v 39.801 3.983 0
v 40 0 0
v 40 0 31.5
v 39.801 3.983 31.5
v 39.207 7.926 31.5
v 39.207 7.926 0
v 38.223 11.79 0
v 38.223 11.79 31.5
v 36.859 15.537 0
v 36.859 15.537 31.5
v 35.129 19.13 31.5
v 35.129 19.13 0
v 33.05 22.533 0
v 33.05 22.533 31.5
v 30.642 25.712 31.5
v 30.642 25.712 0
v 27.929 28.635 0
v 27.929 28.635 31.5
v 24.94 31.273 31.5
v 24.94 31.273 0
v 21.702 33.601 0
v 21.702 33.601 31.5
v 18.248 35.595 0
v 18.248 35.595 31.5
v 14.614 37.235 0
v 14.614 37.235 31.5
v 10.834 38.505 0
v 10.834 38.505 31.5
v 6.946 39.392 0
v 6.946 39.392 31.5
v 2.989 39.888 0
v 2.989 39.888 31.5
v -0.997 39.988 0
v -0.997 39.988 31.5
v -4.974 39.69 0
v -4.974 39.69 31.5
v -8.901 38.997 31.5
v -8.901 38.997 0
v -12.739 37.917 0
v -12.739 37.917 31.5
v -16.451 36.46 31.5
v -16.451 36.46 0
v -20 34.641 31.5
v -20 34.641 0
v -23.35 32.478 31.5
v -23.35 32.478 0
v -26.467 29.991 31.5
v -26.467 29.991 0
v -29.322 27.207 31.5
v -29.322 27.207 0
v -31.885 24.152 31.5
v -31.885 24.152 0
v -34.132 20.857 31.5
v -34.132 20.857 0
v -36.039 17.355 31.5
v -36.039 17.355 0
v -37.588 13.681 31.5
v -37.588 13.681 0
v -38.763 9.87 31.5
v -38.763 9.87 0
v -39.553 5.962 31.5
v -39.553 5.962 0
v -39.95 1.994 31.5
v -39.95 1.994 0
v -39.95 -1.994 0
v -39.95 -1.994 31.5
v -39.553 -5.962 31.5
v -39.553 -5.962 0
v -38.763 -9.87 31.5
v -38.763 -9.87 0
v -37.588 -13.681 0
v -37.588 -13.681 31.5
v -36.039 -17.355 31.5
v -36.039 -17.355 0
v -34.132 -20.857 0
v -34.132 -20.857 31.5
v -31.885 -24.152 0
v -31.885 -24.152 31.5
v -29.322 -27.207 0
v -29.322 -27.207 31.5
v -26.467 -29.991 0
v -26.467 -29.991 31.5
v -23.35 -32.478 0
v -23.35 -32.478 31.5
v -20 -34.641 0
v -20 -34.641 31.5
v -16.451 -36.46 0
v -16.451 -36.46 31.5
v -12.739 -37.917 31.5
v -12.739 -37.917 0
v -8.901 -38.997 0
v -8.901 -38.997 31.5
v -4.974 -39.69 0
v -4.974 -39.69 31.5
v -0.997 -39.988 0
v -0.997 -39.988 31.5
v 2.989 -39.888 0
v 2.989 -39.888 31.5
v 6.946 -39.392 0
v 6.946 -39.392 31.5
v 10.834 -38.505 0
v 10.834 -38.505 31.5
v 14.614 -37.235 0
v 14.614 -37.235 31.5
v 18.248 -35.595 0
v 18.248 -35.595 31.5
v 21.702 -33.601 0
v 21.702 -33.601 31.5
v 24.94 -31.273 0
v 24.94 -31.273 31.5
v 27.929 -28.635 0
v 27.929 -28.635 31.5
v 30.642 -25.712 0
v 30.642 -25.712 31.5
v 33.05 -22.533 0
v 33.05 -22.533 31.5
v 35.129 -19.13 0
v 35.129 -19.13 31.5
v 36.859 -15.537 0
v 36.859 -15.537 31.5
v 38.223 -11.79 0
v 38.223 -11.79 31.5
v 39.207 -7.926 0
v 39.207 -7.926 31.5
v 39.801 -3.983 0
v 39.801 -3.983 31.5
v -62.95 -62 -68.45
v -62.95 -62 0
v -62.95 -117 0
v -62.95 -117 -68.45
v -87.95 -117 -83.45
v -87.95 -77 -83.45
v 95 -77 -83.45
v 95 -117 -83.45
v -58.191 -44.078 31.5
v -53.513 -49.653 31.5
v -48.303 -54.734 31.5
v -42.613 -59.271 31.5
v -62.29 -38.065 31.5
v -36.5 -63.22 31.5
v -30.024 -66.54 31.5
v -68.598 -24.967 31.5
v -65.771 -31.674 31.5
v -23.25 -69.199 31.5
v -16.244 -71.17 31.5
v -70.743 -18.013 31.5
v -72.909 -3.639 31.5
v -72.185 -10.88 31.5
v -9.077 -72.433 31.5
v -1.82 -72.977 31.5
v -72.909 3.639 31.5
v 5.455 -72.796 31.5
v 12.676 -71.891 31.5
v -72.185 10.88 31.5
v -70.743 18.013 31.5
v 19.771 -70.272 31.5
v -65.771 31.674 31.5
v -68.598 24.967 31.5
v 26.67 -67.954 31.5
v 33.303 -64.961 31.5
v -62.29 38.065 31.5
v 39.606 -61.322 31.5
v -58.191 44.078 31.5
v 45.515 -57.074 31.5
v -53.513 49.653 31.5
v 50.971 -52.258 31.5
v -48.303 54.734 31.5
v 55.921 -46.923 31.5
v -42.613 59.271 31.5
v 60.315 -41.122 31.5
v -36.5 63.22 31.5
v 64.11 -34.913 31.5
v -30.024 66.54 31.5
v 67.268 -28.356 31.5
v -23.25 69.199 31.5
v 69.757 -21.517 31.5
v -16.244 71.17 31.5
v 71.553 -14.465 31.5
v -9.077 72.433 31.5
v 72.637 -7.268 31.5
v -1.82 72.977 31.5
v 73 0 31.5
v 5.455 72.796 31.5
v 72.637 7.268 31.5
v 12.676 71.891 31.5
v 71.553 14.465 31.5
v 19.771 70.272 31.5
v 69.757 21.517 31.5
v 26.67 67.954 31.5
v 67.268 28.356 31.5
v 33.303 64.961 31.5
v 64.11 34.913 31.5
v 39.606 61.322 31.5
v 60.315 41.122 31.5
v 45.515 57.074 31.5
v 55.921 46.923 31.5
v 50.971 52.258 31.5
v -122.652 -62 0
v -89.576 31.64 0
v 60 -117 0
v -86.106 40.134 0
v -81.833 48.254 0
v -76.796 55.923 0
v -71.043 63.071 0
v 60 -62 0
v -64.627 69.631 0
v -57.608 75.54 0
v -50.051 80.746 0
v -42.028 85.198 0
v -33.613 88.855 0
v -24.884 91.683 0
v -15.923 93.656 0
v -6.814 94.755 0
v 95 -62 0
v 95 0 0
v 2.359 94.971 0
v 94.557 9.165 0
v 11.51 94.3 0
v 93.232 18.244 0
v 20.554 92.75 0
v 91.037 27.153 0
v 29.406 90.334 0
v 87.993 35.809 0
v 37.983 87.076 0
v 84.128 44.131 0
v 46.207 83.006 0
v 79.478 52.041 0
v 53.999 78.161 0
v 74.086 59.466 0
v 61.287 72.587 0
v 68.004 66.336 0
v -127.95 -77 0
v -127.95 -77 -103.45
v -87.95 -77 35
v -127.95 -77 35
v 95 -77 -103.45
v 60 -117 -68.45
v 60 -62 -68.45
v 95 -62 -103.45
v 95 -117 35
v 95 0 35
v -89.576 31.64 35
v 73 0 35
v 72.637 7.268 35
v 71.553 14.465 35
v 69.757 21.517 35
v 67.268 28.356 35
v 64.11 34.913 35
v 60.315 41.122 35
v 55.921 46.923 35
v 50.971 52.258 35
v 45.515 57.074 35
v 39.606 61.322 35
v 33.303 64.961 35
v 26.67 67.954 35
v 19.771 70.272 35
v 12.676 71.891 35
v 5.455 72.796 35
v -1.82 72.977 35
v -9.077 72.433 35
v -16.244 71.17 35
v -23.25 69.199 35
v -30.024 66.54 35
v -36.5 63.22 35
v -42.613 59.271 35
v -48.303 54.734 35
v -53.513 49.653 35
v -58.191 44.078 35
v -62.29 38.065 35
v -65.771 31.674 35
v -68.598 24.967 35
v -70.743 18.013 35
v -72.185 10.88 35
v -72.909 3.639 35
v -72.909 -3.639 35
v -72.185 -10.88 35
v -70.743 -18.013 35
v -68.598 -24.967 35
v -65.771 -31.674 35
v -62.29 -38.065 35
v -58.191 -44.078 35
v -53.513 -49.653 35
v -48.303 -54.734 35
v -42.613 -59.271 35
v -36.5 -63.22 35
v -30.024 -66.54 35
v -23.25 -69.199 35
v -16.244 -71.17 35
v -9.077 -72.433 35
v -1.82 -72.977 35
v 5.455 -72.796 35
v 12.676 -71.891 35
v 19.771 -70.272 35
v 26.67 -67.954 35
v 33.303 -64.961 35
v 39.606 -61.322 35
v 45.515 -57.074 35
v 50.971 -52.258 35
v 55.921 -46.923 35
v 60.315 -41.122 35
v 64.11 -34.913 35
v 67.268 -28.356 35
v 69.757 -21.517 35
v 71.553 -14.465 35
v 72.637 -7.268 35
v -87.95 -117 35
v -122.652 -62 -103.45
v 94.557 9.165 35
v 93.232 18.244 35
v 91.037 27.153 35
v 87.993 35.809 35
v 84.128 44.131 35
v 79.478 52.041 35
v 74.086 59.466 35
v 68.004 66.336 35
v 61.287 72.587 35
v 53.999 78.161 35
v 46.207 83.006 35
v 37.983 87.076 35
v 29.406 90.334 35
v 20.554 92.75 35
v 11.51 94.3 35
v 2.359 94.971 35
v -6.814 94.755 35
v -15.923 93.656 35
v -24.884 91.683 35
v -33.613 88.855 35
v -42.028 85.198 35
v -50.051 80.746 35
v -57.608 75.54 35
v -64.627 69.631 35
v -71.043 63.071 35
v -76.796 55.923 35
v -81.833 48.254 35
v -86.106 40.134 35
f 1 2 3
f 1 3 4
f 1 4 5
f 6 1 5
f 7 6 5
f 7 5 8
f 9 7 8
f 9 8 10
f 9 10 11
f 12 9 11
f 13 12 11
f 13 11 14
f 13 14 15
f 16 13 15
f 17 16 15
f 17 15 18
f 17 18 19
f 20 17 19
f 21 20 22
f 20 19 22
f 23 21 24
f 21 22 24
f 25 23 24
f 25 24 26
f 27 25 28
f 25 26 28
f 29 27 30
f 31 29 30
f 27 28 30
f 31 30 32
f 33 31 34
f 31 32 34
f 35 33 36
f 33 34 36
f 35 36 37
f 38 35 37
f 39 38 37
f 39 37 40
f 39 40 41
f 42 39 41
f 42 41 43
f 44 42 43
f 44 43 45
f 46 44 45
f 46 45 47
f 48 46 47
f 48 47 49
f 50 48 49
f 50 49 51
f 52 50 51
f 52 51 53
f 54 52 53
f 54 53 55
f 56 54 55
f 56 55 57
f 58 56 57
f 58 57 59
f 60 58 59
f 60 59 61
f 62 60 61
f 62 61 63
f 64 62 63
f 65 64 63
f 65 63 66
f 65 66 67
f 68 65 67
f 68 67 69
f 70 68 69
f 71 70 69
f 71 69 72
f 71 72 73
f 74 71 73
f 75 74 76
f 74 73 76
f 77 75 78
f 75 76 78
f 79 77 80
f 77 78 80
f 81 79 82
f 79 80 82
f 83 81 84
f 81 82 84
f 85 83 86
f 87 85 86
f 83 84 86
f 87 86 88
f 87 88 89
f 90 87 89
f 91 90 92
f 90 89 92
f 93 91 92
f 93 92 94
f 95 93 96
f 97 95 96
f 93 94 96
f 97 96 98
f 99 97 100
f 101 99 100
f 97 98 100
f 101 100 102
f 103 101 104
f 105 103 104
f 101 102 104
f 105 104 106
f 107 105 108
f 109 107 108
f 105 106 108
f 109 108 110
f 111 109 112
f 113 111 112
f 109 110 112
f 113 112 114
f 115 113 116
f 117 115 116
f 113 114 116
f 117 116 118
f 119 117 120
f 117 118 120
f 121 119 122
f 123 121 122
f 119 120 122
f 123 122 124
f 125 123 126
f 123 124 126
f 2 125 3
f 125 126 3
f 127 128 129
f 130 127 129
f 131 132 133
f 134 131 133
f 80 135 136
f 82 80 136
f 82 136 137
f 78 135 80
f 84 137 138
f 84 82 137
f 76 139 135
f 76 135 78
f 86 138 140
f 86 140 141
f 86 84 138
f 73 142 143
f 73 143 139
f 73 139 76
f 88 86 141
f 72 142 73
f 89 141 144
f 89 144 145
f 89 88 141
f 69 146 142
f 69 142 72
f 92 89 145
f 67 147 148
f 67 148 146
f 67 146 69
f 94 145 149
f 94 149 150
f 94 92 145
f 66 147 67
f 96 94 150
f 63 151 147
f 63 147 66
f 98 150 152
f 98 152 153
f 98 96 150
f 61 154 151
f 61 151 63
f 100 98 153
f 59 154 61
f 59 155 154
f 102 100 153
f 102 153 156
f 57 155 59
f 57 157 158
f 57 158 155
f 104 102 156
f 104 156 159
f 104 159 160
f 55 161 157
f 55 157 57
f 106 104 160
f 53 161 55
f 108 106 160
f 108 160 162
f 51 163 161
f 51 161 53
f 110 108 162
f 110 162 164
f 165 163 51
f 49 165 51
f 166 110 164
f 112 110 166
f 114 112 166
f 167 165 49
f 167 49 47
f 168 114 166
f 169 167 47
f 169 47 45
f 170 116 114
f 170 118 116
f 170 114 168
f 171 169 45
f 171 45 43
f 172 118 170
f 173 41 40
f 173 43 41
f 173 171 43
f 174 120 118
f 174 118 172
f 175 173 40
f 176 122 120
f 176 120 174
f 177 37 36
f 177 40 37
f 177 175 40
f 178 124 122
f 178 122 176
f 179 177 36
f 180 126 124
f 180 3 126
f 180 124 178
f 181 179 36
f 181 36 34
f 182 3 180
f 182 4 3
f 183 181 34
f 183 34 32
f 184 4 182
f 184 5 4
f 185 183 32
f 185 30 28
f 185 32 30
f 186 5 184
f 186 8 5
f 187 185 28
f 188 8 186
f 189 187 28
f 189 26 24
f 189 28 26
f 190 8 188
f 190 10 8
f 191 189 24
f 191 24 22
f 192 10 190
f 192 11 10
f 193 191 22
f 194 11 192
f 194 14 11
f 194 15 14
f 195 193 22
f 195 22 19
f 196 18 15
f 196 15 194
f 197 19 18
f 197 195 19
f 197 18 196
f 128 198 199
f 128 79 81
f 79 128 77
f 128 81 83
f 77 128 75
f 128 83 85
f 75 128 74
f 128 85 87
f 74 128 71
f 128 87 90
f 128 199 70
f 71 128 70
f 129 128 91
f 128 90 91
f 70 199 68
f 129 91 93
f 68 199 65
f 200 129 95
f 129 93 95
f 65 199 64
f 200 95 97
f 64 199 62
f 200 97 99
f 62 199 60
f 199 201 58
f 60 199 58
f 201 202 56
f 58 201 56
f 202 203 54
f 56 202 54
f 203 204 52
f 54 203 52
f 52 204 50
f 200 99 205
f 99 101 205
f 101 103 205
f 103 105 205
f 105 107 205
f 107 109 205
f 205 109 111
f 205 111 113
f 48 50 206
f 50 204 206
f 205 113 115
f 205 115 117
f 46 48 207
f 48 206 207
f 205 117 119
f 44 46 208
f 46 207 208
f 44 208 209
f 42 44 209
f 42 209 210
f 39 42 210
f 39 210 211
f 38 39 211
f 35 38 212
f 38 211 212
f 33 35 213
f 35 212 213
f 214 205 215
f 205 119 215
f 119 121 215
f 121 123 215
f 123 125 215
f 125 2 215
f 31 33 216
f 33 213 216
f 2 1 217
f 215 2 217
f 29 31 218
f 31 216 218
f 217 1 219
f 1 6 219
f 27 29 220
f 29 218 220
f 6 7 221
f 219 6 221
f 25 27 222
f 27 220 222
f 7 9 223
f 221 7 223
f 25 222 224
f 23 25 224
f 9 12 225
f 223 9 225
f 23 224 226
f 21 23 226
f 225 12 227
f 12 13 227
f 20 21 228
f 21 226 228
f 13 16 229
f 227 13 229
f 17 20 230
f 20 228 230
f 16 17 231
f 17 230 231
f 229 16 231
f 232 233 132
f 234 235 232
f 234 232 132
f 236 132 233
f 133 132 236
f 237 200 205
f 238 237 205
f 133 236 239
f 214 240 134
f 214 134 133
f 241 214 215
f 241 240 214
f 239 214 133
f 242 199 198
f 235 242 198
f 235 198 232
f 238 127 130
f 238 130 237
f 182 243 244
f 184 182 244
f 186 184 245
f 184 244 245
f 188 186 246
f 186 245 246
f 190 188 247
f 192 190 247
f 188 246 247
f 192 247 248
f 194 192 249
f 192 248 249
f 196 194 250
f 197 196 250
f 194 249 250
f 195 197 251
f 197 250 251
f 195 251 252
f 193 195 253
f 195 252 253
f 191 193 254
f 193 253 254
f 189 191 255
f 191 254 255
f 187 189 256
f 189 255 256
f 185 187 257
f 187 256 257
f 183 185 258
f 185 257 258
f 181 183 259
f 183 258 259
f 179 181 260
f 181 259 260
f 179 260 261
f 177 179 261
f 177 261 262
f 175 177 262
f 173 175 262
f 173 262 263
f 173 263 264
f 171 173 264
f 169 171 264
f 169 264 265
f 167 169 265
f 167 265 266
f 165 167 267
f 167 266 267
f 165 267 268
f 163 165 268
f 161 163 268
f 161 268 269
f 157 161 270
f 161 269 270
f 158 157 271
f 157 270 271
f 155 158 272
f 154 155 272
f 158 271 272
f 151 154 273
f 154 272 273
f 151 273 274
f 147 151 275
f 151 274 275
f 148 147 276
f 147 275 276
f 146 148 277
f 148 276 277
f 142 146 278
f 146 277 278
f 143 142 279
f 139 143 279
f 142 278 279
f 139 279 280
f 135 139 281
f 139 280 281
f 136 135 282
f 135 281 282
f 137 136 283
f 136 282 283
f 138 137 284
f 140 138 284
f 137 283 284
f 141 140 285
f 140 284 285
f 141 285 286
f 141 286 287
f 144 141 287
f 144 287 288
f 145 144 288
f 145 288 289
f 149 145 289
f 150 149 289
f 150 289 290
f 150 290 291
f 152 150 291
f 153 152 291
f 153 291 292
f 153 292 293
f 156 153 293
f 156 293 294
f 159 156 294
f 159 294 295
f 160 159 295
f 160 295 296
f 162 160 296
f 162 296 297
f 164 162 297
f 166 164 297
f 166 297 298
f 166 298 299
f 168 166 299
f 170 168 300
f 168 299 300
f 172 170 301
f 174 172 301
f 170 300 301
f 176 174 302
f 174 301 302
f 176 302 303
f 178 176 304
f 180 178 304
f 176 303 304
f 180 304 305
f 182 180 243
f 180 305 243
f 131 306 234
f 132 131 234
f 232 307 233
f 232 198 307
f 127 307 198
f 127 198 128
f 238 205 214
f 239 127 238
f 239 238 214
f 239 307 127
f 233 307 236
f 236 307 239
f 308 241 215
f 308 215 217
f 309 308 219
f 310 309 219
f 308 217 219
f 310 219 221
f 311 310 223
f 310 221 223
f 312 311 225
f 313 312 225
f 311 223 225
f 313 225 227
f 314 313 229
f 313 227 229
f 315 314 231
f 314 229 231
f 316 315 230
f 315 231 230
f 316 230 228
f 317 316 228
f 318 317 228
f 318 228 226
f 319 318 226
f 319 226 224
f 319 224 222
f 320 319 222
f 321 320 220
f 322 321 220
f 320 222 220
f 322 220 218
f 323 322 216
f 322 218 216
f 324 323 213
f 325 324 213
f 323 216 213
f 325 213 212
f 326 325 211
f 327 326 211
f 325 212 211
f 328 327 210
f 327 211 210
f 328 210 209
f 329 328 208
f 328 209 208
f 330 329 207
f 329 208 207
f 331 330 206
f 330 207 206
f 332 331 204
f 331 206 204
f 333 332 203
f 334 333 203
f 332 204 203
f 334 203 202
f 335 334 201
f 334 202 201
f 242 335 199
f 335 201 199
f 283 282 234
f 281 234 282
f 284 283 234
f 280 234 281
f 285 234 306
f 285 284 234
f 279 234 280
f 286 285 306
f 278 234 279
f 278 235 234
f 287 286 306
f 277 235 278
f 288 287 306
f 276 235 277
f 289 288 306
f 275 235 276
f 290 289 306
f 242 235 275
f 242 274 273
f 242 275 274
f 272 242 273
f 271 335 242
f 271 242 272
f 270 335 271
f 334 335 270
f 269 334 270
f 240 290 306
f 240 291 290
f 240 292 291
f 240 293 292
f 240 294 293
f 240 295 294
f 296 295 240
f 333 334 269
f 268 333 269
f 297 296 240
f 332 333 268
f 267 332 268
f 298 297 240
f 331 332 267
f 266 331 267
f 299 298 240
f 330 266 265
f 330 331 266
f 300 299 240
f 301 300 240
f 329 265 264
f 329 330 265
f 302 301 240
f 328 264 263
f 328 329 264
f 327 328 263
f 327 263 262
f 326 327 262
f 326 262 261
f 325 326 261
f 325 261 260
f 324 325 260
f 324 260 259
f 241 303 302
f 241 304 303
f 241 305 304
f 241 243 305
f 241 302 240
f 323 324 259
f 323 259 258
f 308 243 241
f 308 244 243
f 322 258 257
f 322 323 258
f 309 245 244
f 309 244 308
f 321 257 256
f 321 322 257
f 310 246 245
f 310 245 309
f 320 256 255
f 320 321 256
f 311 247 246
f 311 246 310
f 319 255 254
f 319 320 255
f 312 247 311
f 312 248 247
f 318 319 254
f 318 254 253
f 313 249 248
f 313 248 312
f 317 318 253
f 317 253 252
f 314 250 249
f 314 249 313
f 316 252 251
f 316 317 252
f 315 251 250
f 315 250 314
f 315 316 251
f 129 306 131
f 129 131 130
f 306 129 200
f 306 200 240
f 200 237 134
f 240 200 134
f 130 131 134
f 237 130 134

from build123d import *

# Parameters (mm, degrees)
BOSS_EXTRUDE1_DEPTH = 35
SKETCH2_W           = 35
SKETCH2_H           = 55
BOSS_EXTRUDE2_DEPTH = 83.45
BOSS_EXTRUDE3_DEPTH = 20
SKETCH4_W           = 122.95
SKETCH4_H           = 15
BOSS_EXTRUDE4_DEPTH = 55
SKETCH5_R           = 73
CUT_EXTRUDE1_DEPTH  = 3.5
CUT_EXTRUDE2_REACH  = 221.708
SKETCH6_R           = 40


with BuildPart() as part:
    # Sketch1 → Boss-Extrude1 (new body)
    with BuildSketch(Plane.XY):
        with BuildLine():
            Line((-95, -77), (-87.95, -77))
            Line((-87.95, -77), (-87.95, -95))
            Line((-87.95, -95), (-87.95, -117))
            Line((-87.95, -117), (95, -117))
            Line((95, -117), (95, -95))
            Line((95, -95), (95, 0))
            ThreePointArc((95, 0), (16.050772972, 93.63424954), (-89.576267094, 31.640043828))
            Line((-89.576267094, 31.640043828), (-127.95, -77))
            Line((-127.95, -77), (-95, -77))
        make_face()
    extrude(amount=BOSS_EXTRUDE1_DEPTH)

    # Sketch2 → Boss-Extrude2 (add)
    with BuildSketch(Plane(origin=(0, 0, 0), x_dir=(-1, 0, 0), z_dir=(0, 0, -1))):
        Polygon((127.95, -77), (122.651714273, -62), (88.977103652, -62), (62.95, -62), (62.95, -117), (87.95, -117), (87.95, -77), align=None)
        with Locations((-77.5, -89.5)):
            Rectangle(SKETCH2_W, SKETCH2_H)
    extrude(amount=BOSS_EXTRUDE2_DEPTH)

    # Sketch3 → Boss-Extrude3 (add)
    with BuildSketch(Plane(origin=(0, 0, -83.45), x_dir=(-1, 0, 0), z_dir=(0, 0, -1))):
        Polygon((127.95, -77), (-95, -77), (-95, -62), (122.651714273, -62), align=None)
    extrude(amount=BOSS_EXTRUDE3_DEPTH)

    # Sketch4 → Boss-Extrude4 (add)
    with BuildSketch(Plane(origin=(0, -62, 0), x_dir=(1, 0, 0), z_dir=(0, 1, 0))):
        with Locations((-1.475, 75.95)):
            Rectangle(SKETCH4_W, SKETCH4_H)
    extrude(amount=-BOSS_EXTRUDE4_DEPTH)

    # Sketch5 → Cut-Extrude1 (cut)
    with BuildSketch(Plane.XY.offset(35)):
        Circle(SKETCH5_R)
    extrude(amount=-CUT_EXTRUDE1_DEPTH, mode=Mode.SUBTRACT)

    # Sketch6 → Cut-Extrude2 (cut, up to next)
    with BuildSketch(Plane.XY.offset(31.5), mode=Mode.PRIVATE) as cut_extrude2_sk1:
        Circle(SKETCH6_R)
    cut_extrude2_tool1 = extrude(cut_extrude2_sk1.sketch, amount=-CUT_EXTRUDE2_REACH, mode=Mode.PRIVATE) & part.part
    add(cut_extrude2_tool1.solids().sort_by_distance((0, 0, 31.5))[0], mode=Mode.SUBTRACT)


solid = part.part
